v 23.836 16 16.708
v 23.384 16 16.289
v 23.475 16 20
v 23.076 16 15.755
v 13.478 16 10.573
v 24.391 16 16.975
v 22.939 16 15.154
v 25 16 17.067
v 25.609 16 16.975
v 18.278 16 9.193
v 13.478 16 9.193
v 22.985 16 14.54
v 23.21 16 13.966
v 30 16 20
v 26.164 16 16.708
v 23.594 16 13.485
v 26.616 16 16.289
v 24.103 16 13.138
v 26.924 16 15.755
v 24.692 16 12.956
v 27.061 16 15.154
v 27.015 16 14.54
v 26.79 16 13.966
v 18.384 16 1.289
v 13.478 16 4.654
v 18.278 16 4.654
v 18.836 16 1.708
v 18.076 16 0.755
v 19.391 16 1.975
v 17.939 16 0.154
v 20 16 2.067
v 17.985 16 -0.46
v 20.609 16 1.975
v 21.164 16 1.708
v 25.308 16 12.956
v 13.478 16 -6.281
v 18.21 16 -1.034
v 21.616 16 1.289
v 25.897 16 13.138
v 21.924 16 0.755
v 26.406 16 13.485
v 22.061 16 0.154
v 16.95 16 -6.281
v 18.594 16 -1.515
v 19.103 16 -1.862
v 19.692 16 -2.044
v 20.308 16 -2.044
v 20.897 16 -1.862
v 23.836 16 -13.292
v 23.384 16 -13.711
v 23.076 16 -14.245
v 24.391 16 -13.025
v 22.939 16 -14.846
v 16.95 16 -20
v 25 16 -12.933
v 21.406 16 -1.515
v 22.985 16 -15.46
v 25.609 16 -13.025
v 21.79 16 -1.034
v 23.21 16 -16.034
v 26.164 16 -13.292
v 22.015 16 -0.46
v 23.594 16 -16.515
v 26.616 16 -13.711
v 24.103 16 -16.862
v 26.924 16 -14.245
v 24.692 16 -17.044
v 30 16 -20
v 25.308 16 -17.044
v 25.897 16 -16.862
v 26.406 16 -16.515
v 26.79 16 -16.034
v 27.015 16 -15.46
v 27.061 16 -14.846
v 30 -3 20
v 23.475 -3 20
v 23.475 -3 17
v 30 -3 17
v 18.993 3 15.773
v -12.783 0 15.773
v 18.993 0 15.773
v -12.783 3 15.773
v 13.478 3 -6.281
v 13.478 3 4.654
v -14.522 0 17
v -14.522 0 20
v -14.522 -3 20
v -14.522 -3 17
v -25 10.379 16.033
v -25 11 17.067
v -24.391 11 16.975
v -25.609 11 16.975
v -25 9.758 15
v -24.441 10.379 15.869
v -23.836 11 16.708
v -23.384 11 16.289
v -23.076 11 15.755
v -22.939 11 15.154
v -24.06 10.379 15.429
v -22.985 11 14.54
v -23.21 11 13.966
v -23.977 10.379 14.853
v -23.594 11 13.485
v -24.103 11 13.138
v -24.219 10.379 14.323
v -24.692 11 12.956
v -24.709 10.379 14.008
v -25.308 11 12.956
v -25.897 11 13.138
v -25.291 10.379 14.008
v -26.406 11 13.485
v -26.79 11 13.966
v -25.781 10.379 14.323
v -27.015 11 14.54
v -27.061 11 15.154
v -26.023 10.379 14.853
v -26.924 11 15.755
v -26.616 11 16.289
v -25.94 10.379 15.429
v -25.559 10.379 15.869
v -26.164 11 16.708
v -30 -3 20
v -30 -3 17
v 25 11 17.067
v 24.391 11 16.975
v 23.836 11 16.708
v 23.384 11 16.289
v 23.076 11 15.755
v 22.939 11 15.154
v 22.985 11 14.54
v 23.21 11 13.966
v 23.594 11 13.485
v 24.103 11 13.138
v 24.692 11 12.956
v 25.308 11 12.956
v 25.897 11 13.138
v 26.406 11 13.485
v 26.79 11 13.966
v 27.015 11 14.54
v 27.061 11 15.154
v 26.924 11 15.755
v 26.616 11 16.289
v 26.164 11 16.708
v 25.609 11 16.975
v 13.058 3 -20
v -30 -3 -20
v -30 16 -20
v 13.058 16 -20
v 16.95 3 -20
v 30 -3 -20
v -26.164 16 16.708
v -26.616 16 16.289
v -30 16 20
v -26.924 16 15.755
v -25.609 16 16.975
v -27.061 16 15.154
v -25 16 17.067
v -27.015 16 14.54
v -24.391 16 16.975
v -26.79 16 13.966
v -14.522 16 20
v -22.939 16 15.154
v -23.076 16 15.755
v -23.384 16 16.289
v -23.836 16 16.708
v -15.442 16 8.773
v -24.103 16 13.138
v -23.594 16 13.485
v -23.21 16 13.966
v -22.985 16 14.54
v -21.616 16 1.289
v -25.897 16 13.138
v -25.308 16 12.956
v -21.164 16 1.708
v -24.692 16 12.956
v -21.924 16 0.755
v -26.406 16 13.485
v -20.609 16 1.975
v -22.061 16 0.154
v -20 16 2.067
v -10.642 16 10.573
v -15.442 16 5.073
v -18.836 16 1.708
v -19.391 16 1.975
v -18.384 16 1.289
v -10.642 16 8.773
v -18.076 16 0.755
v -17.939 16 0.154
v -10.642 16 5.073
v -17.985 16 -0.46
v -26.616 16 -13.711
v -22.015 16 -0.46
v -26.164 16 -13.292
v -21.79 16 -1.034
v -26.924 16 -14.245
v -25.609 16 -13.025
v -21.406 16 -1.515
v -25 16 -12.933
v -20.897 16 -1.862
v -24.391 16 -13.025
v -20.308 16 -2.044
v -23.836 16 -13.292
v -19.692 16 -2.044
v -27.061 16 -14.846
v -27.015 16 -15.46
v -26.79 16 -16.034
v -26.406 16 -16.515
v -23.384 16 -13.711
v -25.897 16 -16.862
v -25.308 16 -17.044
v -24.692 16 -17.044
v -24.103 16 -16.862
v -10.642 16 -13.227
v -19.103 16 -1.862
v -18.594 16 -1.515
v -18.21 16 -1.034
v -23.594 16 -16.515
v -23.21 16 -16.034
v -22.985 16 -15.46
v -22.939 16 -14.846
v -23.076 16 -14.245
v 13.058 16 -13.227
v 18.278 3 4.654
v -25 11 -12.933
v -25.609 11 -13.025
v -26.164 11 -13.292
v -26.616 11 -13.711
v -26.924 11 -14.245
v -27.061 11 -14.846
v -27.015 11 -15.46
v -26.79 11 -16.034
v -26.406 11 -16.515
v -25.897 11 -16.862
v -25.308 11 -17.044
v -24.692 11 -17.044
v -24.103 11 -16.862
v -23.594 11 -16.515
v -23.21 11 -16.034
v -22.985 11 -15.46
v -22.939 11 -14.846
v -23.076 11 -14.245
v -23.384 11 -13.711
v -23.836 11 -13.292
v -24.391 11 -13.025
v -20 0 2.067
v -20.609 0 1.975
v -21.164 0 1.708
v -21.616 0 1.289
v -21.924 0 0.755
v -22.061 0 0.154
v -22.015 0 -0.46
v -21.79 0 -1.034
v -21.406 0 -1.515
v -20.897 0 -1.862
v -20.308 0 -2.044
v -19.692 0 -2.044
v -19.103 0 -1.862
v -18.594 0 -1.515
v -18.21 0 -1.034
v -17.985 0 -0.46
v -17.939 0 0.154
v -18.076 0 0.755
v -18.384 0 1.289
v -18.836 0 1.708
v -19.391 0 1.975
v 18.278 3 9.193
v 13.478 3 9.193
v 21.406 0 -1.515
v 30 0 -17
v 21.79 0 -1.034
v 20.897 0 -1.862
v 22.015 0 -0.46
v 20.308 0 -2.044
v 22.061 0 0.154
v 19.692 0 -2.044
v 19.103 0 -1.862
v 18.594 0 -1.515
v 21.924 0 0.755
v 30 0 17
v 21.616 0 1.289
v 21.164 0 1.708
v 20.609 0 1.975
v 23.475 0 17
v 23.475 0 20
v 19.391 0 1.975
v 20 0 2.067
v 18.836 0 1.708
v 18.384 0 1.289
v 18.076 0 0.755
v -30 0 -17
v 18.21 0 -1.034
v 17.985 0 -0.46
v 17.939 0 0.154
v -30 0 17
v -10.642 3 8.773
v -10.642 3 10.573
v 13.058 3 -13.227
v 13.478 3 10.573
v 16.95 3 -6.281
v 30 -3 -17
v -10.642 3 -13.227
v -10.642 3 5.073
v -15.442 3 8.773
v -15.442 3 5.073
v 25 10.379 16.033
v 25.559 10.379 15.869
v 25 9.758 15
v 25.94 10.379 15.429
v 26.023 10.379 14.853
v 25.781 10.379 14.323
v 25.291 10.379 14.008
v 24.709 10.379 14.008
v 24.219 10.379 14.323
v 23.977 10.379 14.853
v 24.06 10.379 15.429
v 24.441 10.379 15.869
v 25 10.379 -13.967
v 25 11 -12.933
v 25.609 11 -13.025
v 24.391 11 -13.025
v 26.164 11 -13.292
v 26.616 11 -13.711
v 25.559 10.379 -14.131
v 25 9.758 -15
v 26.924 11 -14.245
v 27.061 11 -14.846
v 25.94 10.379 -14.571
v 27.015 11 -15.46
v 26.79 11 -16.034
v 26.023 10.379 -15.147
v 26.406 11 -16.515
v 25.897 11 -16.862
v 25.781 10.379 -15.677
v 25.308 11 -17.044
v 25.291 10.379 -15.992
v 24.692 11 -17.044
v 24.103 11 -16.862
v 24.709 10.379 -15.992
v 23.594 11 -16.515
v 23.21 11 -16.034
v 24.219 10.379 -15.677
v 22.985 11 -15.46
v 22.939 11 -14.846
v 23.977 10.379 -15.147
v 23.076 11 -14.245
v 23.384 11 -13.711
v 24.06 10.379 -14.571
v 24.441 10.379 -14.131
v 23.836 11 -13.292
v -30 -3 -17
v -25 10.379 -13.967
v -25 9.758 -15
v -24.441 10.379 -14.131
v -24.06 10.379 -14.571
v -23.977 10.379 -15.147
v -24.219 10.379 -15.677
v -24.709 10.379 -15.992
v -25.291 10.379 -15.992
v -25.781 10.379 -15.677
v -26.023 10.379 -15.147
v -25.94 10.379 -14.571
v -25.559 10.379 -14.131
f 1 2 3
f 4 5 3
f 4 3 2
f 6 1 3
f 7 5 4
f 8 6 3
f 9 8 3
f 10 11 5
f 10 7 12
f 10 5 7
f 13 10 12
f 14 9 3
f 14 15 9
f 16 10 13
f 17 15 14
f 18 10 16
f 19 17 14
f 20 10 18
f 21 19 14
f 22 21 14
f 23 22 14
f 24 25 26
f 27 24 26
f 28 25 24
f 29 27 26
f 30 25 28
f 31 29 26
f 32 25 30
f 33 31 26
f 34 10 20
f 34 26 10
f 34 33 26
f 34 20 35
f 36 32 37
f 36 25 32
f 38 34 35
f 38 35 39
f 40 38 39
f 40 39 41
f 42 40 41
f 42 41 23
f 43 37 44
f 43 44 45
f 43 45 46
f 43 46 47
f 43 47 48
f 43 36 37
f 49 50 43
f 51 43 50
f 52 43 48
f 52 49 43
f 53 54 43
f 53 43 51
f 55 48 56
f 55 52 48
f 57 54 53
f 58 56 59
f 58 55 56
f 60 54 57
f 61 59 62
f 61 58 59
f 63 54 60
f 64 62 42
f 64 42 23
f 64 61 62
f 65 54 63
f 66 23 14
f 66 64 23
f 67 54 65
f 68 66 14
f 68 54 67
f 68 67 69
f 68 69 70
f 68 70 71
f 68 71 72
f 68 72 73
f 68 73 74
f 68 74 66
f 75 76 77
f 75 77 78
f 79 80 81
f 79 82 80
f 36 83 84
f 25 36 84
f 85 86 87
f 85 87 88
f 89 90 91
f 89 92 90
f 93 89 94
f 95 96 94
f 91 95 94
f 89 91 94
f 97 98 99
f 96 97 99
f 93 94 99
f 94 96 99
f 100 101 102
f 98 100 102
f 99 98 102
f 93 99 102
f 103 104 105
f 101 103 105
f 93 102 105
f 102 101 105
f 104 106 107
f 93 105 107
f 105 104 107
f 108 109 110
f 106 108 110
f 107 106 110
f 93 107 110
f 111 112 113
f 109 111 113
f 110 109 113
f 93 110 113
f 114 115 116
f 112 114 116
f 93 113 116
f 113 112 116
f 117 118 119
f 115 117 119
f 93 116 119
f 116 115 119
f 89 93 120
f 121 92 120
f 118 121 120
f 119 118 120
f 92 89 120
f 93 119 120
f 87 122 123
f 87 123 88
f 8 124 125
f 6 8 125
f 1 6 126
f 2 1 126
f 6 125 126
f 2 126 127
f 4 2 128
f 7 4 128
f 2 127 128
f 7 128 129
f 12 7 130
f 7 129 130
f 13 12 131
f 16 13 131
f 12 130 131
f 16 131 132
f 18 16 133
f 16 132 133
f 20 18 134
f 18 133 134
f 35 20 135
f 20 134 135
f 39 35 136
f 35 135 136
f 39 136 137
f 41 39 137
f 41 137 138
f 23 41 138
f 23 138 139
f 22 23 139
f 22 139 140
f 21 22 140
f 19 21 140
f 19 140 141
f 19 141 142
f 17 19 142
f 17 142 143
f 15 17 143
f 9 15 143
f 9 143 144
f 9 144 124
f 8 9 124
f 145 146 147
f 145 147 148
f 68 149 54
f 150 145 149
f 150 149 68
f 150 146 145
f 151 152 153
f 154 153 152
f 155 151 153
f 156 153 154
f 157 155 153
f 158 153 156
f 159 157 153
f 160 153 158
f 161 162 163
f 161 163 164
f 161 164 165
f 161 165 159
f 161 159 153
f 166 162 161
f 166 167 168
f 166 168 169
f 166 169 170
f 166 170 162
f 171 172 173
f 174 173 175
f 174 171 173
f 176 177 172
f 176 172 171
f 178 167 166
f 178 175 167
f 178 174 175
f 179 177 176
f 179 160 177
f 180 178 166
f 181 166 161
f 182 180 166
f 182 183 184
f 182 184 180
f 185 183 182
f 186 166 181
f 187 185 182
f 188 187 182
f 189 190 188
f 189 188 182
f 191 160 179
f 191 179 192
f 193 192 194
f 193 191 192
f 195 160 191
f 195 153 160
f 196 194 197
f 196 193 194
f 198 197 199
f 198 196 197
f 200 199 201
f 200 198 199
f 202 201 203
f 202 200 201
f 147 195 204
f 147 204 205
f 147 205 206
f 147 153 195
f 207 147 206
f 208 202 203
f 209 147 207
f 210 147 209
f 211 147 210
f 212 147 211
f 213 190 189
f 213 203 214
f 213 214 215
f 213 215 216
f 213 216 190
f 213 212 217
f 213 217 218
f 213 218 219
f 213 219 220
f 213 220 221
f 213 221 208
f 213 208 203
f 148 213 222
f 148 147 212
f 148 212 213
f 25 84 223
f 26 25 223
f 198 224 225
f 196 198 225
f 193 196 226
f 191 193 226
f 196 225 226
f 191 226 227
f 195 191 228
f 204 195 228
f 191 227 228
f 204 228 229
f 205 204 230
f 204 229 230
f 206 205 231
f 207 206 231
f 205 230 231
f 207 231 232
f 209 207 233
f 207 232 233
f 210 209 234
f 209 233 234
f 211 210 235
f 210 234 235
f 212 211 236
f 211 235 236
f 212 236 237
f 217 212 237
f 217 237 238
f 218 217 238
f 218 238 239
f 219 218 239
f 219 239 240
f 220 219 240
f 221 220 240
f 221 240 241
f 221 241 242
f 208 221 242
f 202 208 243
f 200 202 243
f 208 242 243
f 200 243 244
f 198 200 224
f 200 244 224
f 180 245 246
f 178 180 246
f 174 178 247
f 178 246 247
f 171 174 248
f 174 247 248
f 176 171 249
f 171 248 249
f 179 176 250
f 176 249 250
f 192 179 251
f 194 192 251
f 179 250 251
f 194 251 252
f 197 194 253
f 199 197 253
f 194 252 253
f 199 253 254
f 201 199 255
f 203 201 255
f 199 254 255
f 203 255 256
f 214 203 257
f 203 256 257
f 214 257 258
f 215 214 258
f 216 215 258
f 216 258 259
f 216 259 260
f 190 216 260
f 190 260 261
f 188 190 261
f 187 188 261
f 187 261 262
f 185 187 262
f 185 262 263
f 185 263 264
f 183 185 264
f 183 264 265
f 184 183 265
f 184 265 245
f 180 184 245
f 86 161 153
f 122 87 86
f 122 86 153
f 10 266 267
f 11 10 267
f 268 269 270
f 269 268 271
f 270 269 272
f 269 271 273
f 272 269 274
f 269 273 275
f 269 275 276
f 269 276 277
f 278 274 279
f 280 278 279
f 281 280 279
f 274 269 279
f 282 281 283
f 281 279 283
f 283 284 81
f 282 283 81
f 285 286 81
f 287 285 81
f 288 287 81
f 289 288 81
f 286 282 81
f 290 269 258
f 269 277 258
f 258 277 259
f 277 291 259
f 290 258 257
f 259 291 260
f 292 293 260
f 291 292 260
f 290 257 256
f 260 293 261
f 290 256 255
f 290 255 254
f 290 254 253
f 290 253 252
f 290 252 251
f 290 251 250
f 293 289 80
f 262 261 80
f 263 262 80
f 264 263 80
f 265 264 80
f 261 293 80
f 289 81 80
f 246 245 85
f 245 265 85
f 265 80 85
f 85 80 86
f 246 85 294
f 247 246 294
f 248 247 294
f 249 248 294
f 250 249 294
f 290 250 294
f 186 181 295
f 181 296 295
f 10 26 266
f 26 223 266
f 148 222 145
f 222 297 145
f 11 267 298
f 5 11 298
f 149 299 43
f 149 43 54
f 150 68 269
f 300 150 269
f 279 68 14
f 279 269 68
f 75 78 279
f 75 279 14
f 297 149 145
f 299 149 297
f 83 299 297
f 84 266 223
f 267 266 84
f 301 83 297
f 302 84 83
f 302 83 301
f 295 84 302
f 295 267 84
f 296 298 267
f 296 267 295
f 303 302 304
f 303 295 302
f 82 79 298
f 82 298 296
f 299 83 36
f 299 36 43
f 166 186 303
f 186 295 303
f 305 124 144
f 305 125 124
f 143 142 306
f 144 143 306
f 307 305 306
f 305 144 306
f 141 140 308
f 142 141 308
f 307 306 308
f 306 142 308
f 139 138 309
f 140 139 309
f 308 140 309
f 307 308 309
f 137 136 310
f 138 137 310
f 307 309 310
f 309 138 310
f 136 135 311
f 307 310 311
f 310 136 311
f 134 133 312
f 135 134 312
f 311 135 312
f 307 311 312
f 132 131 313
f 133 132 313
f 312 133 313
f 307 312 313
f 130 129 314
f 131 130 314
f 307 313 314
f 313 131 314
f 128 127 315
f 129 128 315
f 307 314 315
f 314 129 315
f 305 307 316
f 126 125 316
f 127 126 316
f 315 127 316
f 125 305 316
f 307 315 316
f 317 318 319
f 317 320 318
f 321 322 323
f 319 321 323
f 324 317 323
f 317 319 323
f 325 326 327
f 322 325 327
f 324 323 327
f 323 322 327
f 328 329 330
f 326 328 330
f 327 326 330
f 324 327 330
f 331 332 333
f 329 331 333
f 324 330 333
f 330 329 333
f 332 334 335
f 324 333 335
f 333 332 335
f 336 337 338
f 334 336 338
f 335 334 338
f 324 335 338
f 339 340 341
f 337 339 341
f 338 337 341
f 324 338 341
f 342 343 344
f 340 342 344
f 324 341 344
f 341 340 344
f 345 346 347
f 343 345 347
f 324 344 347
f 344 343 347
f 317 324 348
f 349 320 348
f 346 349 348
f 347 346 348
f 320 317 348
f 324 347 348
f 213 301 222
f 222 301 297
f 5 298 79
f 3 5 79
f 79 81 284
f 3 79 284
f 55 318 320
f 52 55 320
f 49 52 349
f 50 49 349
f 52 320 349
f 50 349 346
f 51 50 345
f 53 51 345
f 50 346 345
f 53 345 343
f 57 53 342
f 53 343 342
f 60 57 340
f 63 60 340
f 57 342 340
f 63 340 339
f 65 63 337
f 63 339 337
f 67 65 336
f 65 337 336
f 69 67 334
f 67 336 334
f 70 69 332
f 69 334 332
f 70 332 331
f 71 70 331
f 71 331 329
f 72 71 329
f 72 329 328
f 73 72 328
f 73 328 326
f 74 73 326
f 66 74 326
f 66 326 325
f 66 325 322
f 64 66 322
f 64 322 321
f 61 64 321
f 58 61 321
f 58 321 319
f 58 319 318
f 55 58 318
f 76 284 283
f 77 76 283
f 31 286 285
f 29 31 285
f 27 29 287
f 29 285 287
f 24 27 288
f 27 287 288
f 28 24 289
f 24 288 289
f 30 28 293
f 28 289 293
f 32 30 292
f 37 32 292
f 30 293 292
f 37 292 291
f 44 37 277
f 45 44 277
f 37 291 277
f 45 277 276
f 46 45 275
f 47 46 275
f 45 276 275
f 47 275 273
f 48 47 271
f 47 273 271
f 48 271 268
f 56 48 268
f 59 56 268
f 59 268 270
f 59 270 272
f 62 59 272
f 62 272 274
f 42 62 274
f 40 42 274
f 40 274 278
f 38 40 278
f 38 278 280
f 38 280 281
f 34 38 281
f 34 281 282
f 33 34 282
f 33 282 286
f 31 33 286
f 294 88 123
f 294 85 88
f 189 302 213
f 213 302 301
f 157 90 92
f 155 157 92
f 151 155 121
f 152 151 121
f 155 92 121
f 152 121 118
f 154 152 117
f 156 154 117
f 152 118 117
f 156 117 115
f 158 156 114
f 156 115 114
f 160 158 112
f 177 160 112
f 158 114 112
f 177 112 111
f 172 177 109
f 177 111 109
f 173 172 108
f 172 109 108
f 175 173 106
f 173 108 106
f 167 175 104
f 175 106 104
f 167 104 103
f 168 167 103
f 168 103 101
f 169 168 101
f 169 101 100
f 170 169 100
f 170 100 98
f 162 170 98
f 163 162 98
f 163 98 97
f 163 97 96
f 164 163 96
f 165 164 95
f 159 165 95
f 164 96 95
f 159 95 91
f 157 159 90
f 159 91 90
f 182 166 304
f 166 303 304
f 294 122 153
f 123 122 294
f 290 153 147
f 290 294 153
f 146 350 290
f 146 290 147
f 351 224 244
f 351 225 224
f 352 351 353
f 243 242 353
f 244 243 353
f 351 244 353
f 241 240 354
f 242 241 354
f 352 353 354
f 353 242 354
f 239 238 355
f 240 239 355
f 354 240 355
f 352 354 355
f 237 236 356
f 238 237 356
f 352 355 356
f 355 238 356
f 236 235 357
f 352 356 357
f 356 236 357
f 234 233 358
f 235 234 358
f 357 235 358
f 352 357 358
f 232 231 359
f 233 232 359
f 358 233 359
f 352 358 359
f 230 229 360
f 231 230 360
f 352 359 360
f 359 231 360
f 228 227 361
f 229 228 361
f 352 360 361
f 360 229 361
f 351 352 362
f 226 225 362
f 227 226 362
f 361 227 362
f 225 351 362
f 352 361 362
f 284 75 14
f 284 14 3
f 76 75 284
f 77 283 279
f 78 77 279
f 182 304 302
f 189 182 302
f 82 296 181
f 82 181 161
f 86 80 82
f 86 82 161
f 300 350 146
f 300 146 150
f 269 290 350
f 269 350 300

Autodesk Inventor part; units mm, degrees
ref_plane "YZ Plane" through (0, 0, 0) normal (1, 0, 0) x (0, 1, 0)
ref_plane "XZ Plane" through (0, 0, 0) normal (0, 1, 0) x (-1, 0, 0)
ref_plane "XY Plane" through (0, 0, 0) normal (0, 0, 1) x (1, 0, 0)
sketch "Szkic1" plane through (0, 0, 0) normal (0, 1, 0) x (-1, 0, 0)
  line L0 (30, -20) -> (-30, -20)
  line L1 (-30, -20) -> (-30, 20)
  line L2 (-30, 20) -> (30, 20)
  line L3 (30, 20) -> (30, -20)
  line L4 (30, -20) -> (-30, 20) construction
  line L5 (-30, -20) -> (30, 20) construction
  point P0 (0, 0)
  dimension "d0" = 60
  dimension "d1" = 40
extrude "Wyciągnięcie proste1" add sketch "Szkic1" along normal blind 3
sketch "Szkic6" plane through (0, 3, 0) normal (0, 1, 0) x (1, 0, 0)
  line L0 (17.3578, -5.5734) -> (12.5578, -5.5734) projected
  line L1 (12.5578, -5.5734) -> (12.5578, 12.7266) projected
  line L2 (12.5578, 12.7266) -> (-10.1422, 12.7266) projected
  line L3 (-10.1422, -5.5734) -> (-10.1422, 12.7266) projected
  line L4 (-10.1422, -5.5734) -> (-14.9422, -5.5734) projected
  line L5 (-14.9422, -5.5734) -> (-14.9422, -8.2734) projected
  line L6 (-10.1422, -8.2734) -> (-14.9422, -8.2734) projected
  line L7 (-10.1422, -8.2734) -> (-10.1422, -10.0734) projected
  line L8 (-10.1422, -10.0734) -> (12.5578, -10.0734) construction
  line L9 (12.5578, -8.2734) -> (12.5578, -10.0734) projected
  line L10 (17.3578, -8.2734) -> (12.5578, -8.2734) projected
  line L11 (17.3578, -5.5734) -> (17.3578, -8.2734) projected
  line L12 (-8.8922, -2.4734) -> (11.3078, -2.4734) projected
  line L13 (-8.8922, 7.7266) -> (-8.8922, -2.4734) projected
  line L14 (11.3078, 7.7266) -> (-8.8922, 7.7266) projected
  line L15 (11.3078, -2.4734) -> (11.3078, 7.7266) projected
  line L16 (-30, -20) -> (30, -20) projected
  line L17 (30, -20) -> (30, 20) projected
  line L18 (30, -20) -> (30, 20)
  line L19 (-30, 20) -> (-30, -20)
  line L20 (-30, -20) -> (-14.5223, -20)
  line L21 (23.4752, -20) -> (30, -20)
  line L22 (-10.6422, 13.2266) -> (13.0578, 13.2266)
  line L23 (13.4777, 6.2814) -> (13.4777, -4.6535)
  line L24 (13.4777, -4.6535) -> (18.2777, -4.6535)
  line L25 (18.2777, -4.6535) -> (18.2777, -9.1933)
  line L26 (18.2777, -9.1933) -> (13.4777, -9.1933)
  line L27 (13.4777, -9.1933) -> (13.4777, -10.5734)
  line L28 (-10.6422, -10.5734) -> (-10.6422, -8.7734)
  line L29 (-10.6422, -8.7734) -> (-15.4422, -8.7734)
  line L30 (-15.4422, -8.7734) -> (-15.4422, -5.0734)
  line L31 (-15.4422, -5.0734) -> (-10.6422, -5.0734)
  line L32 (-10.6422, -5.0734) -> (-10.6422, 13.2266)
  line L33 (13.4777, -10.5734) -> (23.4752, -20)
  line L34 (-10.6422, -10.5734) -> (-14.5223, -20)
  line L35 (13.4777, 6.2814) -> (16.9504, 6.2814)
  line L36 (16.9504, 6.2814) -> (16.9504, 20)
  line L37 (13.0578, 13.2266) -> (13.0578, 20)
  line L38 (30, 20) -> (16.9504, 20)
  line L39 (13.0578, 20) -> (-30, 20)
  point P0 (0, 0)
  dimension "d4" = 0.5
extrude "Wyciągnięcie proste2" add sketch "Szkic6" along normal blind 13 contours L19 L39 L37 L22 L32 L31 L30 L29 L28 L34 L16 | L33 L27 L26 L25 L24 L23 L35 L36 L38 L17 L16
sketch "Szkic7" plane through (0, 3, 0) normal (0, 1, 0) x (1, 0, 0)
  line L0 (13.0578, 20) -> (13.0578, 13.2266) projected
  line L1 (13.0578, 13.2266) -> (-10.6422, 13.2266) projected
  line L2 (-10.6422, 13.2266) -> (-10.6422, -5.0734) projected
  line L3 (-10.6422, -5.0734) -> (-15.4422, -5.0734) projected
  line L4 (-15.4422, -5.0734) -> (-15.4422, -8.7734) projected
  line L5 (-15.4422, -8.7734) -> (-10.6422, -8.7734) projected
  line L6 (-10.6422, -8.7734) -> (-10.6422, -10.5734) projected
  line L7 (-10.6422, -10.5734) -> (-14.5223, -20) projected
  line L8 (-14.5223, -20) -> (23.4752, -20) projected
  line L9 (23.4752, -20) -> (13.4777, -10.5734) projected
  line L10 (13.4777, -10.5734) -> (13.4777, -9.1933) projected
  line L11 (13.4777, -9.1933) -> (18.2777, -9.1933) projected
  line L12 (18.2777, -9.1933) -> (18.2777, -4.6535) projected
  line L13 (18.2777, -4.6535) -> (13.4777, -4.6535) projected
  line L14 (13.4777, -4.6535) -> (13.4777, 6.2814) projected
  line L15 (13.4777, 6.2814) -> (16.9504, 6.2814) projected
  line L16 (16.9504, 6.2814) -> (16.9504, 20) projected
  line L17 (16.9504, 20) -> (13.0578, 20) projected
  line L18 (1.3504, -15.7734) -> (12.6578, -15.7734) projected
  line L19 (-12.7826, -15.7734) -> (18.9926, -15.7734)
  point P0 (0, 0)
  point P1 (12.6578, -15.7734)
  point P2 (1.3504, -15.7734)
extrude "Wyciągnięcie proste3" cut sketch "Szkic7" against normal blind 13 contours L19 L18 L9 L8 L7
sketch "Szkic8" plane through (0, 16, 0) normal (0, 1, 0) x (1, 0, 0)
  line L0 (-30, 20) -> (-30, -20) projected
  line L1 (-30, -20) -> (-14.5223, -20) projected
  line L2 (30, 20) -> (-30, 20) projected
  line L3 (-30, 0) -> (30, 0) construction
  line L4 (0, 20) -> (0, -29.6332) construction
  point P0 (0, 0)
  point P1 (-25, -15)
  point P2 (-25, 15)
  point P3 (25, 15)
  point P4 (25, -15)
  dimension "d9" = 5
  dimension "d10" = 5
hole "Otwór1" at (-25, 16, 15) at (-25, 16, -15) at (25, 16, -15) at (25, 16, 15) direction (0, -1, 0) diameter 4.134 depth 5 tip angle 118 thread size "M5x0.8" class "6H" standard "ISO Metric profile"
sketch "Szkic9" plane through (0, 0, 0) normal (0, -1, 0) x (1, 0, 0)
  line L0 (30, 20) -> (30, -20) projected
  line L1 (30, -20) -> (-30, -20)
  line L2 (-30, -20) -> (-30, -17)
  line L3 (-30, -17) -> (30, -17)
  line L4 (30, -17) -> (30, -20)
  line L5 (18.9926, 15.7734) -> (-12.7826, 15.7734) projected
  line L6 (30, 20) -> (23.4752, 20)
  line L7 (23.4752, 17) -> (30, 17)
  line L8 (30, 17) -> (30, 20)
  line L9 (23.4752, 20) -> (18.9926, 15.7734) projected
  line L10 (23.4752, 20) -> (23.4752, 17)
  line L11 (-30, 20) -> (-14.5223, 20) projected
  line L12 (-30, 20) -> (-14.5223, 20)
  line L13 (-14.5223, 17) -> (-30, 17)
  line L14 (-30, 17) -> (-30, 20)
  line L15 (-14.5223, 20) -> (-10.6422, 10.5734) projected
  line L16 (-14.5223, 20) -> (-14.5223, 17)
  point P0 (0, 0)
  dimension "d18" = 60
  dimension "d19" = 3
  dimension "d31" = 3
  dimension "d32" = 3
extrude "Wyciągnięcie proste4" add sketch "Szkic9" along normal blind 3
sketch "Szkic10" plane through (0, 16, 0) normal (0, 1, 0) x (1, 0, 0)
  line L0 (-30, 20) -> (-30, -20) projected
  line L1 (30, -20) -> (30, 20) projected
  point P0 (0, 0)
  point P1 (-20, 0)
  point P2 (20, 0)
  dimension "d22" = 10
  dimension "d23" = 10
hole "Otwór2" at (-20, 16, 0) at (20, 16, 0) direction (0, -1, 0) diameter 4.134 end through all thread size "M5x0.8" class "6H" standard "ISO Metric profile"
properties part number "Podstawa"
